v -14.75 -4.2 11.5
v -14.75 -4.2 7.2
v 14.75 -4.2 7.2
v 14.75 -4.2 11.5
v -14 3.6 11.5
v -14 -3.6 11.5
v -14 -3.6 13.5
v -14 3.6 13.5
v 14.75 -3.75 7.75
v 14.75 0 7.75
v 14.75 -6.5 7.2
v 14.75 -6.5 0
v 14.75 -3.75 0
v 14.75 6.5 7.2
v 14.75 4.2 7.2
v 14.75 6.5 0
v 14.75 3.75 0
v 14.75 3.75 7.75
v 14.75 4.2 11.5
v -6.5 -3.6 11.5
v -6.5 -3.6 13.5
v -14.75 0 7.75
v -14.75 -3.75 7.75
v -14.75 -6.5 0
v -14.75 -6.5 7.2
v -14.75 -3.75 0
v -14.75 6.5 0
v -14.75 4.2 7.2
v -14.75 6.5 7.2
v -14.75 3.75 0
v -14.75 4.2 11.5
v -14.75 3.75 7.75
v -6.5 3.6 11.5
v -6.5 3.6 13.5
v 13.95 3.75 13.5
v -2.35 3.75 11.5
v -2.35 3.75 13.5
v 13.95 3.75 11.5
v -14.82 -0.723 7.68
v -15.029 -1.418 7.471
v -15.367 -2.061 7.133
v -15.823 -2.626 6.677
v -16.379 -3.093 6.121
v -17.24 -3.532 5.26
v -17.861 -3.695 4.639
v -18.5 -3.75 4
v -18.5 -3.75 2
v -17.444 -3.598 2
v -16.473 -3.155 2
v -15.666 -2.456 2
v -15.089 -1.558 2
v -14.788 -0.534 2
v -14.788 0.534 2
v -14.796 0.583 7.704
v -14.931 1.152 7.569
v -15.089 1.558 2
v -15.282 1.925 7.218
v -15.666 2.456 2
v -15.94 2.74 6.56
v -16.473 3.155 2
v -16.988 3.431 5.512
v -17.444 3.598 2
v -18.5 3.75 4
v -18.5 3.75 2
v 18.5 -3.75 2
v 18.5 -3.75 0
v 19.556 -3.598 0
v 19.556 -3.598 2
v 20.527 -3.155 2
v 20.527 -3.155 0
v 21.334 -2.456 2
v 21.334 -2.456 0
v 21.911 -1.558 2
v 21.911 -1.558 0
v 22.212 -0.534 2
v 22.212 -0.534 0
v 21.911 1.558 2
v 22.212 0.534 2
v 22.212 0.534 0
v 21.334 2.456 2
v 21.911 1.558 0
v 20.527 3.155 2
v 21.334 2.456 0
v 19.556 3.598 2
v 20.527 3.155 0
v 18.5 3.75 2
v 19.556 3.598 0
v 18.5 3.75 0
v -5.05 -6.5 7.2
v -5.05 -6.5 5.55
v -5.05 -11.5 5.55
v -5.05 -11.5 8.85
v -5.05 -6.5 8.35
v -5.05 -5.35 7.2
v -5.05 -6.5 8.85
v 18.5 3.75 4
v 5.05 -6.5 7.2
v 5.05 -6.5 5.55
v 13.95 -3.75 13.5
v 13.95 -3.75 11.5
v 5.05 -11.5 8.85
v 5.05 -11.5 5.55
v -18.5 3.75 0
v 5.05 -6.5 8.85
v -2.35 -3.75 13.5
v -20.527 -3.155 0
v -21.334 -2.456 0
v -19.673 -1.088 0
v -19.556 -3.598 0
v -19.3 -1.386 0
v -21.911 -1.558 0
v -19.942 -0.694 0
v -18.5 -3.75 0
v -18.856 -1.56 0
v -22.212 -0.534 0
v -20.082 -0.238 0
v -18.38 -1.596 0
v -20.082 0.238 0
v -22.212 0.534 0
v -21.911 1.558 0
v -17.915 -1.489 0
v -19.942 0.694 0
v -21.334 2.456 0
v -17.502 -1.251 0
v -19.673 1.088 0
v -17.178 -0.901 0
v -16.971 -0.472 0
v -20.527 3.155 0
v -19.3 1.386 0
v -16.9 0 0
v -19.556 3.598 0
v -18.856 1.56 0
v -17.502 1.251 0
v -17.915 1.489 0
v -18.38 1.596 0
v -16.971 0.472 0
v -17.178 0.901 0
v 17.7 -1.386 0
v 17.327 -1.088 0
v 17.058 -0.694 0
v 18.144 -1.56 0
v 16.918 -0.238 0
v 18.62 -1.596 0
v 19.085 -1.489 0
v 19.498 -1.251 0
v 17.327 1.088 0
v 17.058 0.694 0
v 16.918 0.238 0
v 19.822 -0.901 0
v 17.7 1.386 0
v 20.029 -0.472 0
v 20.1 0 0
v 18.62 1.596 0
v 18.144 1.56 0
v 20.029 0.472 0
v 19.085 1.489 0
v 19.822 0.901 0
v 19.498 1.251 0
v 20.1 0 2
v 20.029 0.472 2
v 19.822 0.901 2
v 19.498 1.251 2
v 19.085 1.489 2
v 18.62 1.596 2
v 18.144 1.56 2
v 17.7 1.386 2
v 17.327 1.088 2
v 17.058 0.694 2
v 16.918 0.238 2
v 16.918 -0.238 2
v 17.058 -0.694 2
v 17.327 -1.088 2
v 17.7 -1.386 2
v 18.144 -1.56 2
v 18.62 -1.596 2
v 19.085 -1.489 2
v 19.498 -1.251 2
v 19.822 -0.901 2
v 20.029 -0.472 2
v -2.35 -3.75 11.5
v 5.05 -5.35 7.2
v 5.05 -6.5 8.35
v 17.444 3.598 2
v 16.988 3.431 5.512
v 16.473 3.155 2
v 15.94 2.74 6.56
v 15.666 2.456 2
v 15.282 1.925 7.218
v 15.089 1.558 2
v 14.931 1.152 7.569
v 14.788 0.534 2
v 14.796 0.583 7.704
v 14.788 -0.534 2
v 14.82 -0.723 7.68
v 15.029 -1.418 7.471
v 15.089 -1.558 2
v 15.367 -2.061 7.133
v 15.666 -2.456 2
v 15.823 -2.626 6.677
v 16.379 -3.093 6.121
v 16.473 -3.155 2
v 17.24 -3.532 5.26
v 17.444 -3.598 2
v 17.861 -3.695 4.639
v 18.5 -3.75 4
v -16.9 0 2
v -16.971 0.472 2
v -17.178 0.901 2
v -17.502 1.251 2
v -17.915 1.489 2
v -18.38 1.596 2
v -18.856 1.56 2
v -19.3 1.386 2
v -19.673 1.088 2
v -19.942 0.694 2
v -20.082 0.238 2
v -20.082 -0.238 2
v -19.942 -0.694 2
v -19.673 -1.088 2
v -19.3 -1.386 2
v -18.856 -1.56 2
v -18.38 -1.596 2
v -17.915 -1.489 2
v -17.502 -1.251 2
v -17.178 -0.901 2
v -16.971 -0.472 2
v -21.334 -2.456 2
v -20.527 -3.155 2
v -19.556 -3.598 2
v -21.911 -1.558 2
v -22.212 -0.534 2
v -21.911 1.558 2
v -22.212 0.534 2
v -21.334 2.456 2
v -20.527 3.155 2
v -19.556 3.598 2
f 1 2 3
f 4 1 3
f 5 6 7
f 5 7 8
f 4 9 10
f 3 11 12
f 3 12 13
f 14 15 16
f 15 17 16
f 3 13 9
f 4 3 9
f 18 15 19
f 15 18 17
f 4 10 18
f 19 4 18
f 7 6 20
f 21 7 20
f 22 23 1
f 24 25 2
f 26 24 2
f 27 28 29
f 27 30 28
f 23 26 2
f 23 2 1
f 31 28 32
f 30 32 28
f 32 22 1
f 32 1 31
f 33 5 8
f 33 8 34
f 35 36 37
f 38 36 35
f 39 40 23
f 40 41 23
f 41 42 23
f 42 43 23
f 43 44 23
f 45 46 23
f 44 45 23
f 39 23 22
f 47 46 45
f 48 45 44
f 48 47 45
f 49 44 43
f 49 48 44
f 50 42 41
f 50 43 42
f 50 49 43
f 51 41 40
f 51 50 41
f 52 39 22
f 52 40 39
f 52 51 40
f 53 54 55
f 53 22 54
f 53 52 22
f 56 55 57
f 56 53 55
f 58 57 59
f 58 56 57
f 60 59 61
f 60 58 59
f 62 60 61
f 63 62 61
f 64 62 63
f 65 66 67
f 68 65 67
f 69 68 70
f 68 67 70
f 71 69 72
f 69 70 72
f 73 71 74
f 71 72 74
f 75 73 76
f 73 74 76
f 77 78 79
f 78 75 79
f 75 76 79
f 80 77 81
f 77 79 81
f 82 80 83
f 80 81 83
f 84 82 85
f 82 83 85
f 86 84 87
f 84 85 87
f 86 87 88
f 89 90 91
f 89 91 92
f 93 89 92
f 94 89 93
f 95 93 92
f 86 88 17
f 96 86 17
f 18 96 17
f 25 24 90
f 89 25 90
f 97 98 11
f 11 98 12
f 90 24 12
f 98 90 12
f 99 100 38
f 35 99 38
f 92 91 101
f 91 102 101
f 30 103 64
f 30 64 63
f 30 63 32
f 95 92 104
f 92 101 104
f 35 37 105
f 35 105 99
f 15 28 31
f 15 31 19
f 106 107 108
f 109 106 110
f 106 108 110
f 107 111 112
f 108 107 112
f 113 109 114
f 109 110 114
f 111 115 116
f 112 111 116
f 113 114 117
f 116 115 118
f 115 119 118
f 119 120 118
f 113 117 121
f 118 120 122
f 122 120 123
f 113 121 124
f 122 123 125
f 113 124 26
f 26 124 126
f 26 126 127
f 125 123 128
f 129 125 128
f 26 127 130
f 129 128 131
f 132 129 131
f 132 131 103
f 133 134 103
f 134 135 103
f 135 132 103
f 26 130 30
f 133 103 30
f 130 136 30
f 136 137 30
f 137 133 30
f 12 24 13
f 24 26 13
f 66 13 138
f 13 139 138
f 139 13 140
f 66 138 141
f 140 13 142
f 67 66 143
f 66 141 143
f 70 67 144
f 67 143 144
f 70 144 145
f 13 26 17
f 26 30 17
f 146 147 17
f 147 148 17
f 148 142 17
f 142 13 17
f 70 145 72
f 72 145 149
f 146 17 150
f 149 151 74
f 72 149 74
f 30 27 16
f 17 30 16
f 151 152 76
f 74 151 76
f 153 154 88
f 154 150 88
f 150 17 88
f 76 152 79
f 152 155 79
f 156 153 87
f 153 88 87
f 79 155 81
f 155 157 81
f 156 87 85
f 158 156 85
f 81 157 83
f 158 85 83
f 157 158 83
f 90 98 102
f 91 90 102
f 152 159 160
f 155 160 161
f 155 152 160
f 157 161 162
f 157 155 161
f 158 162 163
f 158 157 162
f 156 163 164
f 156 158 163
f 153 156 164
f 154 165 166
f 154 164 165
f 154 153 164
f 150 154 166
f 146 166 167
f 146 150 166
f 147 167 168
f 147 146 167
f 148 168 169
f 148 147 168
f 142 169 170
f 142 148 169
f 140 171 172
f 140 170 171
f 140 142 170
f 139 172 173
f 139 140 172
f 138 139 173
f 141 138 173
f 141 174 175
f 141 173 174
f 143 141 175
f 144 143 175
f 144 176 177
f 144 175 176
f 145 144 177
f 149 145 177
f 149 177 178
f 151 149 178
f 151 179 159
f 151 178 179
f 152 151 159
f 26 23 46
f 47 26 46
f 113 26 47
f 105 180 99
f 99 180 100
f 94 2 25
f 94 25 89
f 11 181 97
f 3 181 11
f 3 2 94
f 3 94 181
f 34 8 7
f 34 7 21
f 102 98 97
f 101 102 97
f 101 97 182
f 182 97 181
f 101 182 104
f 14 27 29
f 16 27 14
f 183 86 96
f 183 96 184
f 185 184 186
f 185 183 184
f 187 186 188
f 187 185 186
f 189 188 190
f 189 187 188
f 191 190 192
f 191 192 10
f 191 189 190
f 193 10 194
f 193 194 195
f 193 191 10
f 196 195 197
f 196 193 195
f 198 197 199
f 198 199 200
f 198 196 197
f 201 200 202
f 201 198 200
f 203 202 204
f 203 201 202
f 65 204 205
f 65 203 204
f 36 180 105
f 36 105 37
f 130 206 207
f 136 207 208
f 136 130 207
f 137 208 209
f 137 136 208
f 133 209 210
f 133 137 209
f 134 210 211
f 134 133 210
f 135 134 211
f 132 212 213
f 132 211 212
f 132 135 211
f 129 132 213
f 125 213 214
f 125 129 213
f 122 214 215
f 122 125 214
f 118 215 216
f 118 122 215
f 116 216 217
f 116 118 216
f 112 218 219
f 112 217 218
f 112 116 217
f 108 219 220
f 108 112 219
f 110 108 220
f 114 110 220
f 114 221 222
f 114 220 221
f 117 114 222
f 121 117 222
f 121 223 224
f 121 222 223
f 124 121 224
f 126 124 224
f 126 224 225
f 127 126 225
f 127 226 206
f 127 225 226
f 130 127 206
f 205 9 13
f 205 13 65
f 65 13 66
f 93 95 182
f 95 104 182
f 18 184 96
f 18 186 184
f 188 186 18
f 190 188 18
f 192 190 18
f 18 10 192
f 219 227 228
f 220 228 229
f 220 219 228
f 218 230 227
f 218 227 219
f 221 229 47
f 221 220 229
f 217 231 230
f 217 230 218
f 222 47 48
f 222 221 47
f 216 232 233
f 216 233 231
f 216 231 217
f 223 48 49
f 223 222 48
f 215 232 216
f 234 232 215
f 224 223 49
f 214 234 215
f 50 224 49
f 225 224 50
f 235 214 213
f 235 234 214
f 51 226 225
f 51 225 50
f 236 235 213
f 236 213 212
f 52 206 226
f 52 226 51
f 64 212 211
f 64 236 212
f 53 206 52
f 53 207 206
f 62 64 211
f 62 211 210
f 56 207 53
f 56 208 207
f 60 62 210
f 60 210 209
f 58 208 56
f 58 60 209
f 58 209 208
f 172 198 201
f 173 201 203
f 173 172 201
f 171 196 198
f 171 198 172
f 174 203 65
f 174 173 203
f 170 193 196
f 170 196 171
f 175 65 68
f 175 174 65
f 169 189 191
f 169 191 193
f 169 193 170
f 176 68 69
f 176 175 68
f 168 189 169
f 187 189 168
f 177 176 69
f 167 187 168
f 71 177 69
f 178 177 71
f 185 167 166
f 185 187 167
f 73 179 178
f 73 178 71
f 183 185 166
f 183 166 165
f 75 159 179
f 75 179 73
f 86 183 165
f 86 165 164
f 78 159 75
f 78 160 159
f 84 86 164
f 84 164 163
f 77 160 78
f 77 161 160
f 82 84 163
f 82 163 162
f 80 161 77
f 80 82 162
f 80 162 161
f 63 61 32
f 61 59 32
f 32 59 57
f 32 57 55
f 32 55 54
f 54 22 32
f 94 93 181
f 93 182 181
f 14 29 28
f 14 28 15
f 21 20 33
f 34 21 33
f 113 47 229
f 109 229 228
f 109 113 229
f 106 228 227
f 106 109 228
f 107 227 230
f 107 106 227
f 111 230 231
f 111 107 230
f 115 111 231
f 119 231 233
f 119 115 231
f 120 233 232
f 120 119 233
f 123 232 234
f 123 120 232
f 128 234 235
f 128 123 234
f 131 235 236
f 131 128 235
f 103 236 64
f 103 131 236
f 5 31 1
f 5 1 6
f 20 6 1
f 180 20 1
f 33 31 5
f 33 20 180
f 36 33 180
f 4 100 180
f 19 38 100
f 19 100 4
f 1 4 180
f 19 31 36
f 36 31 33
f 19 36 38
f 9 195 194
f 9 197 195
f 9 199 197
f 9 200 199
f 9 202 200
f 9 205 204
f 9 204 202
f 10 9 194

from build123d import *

# Parameters (mm, degrees)
SKETCH1_W               = 29.5
SKETCH1_H               = 8.4
BOSS_EXTRUDE1_DEPTH     = 11.5
SKETCH2_W               = 7.5
SKETCH2_H               = 7.2
SKETCH2_W_2             = 16.3
SKETCH2_H_2             = 7.5
BOSS_EXTRUDE2_DEPTH     = 2
SKETCH3_W               = 29.5
SKETCH3_H               = 13
BOSS_EXTRUDE3_DEPTH     = 7.2
BOSS_EXTRUDE4_DEPTH     = 5.05
SKETCH5_R               = 1.6
BOSS_EXTRUDE5_DEPTH     = 10
CUT_EXTRUDE1_START      = -8
SKETCH8_R               = 3.75
CUT_EXTRUDE1_DEPTH      = 8
CUT_EXTRUDE2_DEPTH      = 29.452811812
CUT_EXTRUDE2_DEPTH_BACK = 29.452811812


with BuildPart() as part:
    # Sketch1 → Boss-Extrude1 (new body)
    with BuildSketch(Plane.XY):
        Rectangle(SKETCH1_W, SKETCH1_H)
    extrude(amount=BOSS_EXTRUDE1_DEPTH)

    # Sketch2 → Boss-Extrude2 (add)
    with BuildSketch(Plane.XY.offset(11.5)):
        with Locations((-10.25, 0)):
            Rectangle(SKETCH2_W, SKETCH2_H)
        with Locations((5.8, 0)):
            Rectangle(SKETCH2_W_2, SKETCH2_H_2)
    extrude(amount=BOSS_EXTRUDE2_DEPTH)

    # Sketch3 → Boss-Extrude3 (add)
    with BuildSketch(Plane.XY):
        Rectangle(SKETCH3_W, SKETCH3_H)
    extrude(amount=BOSS_EXTRUDE3_DEPTH)

    # Sketch4 → Boss-Extrude4 (add, symmetric)
    with BuildSketch(Plane(origin=(0, 0, 0), x_dir=(0, 0, -1), z_dir=(1, 0, 0))):
        Polygon((-5.55, -6.5), (-5.55, -11.5), (-8.85, -11.5), (-8.85, -6.5), (-8.35, -6.5), (-7.2, -5.35), (-7.2, -6.5), align=None)
    extrude(amount=BOSS_EXTRUDE4_DEPTH, both=True)

    # Sketch5 → Boss-Extrude5 (add)
    # profile 1 of 2: a face of its own
    with BuildSketch(Plane.XY):
        with BuildLine():
            Line((-18.5, 3.75), (-14.75, 3.75))
            Line((-14.75, 3.75), (-14.75, -3.75))
            Line((-14.75, -3.75), (-18.5, -3.75))
            ThreePointArc((-18.5, -3.75), (-22.25, 0), (-18.5, 3.75))
        make_face()
        with Locations((-18.5, 0)):
            Circle(SKETCH5_R, mode=Mode.SUBTRACT)
    # profile 2 of 2: a face of its own
    with BuildSketch(Plane.XY):
        with BuildLine():
            Line((18.5, 3.75), (14.75, 3.75))
            Line((14.75, 3.75), (14.75, -3.75))
            Line((14.75, -3.75), (18.5, -3.75))
            ThreePointArc((18.5, -3.75), (22.25, 0), (18.5, 3.75))
        make_face()
        with Locations((18.5, 0)):
            Circle(SKETCH5_R, mode=Mode.SUBTRACT)
    extrude(amount=BOSS_EXTRUDE5_DEPTH)

    # Sketch8 → Cut-Extrude1 (cut)
    with BuildSketch(Plane.XY.offset(10).offset(CUT_EXTRUDE1_START)):
        with Locations((-18.5, 0)):
            Circle(SKETCH8_R)
        with Locations((18.5, 0)):
            Circle(SKETCH8_R)
    extrude(amount=CUT_EXTRUDE1_DEPTH, mode=Mode.SUBTRACT)

    # Sketch9 → Cut-Extrude2 (cut, two sides: drawn at the far end of the back side and taken through both)
    with BuildSketch(Plane(origin=(0, 0, 0), x_dir=(1, 0, 0), z_dir=(0, 1, 0)).offset(-CUT_EXTRUDE2_DEPTH_BACK)):
        Polygon((-18.5, -4), (-14.75, -7.75), (-14.75, -10), (-18.5, -10), align=None)
        Polygon((18.5, -10), (18.5, -4), (14.75, -7.75), (14.75, -10), align=None)
    extrude(amount=CUT_EXTRUDE2_DEPTH + CUT_EXTRUDE2_DEPTH_BACK, mode=Mode.SUBTRACT)


solid = part.part
